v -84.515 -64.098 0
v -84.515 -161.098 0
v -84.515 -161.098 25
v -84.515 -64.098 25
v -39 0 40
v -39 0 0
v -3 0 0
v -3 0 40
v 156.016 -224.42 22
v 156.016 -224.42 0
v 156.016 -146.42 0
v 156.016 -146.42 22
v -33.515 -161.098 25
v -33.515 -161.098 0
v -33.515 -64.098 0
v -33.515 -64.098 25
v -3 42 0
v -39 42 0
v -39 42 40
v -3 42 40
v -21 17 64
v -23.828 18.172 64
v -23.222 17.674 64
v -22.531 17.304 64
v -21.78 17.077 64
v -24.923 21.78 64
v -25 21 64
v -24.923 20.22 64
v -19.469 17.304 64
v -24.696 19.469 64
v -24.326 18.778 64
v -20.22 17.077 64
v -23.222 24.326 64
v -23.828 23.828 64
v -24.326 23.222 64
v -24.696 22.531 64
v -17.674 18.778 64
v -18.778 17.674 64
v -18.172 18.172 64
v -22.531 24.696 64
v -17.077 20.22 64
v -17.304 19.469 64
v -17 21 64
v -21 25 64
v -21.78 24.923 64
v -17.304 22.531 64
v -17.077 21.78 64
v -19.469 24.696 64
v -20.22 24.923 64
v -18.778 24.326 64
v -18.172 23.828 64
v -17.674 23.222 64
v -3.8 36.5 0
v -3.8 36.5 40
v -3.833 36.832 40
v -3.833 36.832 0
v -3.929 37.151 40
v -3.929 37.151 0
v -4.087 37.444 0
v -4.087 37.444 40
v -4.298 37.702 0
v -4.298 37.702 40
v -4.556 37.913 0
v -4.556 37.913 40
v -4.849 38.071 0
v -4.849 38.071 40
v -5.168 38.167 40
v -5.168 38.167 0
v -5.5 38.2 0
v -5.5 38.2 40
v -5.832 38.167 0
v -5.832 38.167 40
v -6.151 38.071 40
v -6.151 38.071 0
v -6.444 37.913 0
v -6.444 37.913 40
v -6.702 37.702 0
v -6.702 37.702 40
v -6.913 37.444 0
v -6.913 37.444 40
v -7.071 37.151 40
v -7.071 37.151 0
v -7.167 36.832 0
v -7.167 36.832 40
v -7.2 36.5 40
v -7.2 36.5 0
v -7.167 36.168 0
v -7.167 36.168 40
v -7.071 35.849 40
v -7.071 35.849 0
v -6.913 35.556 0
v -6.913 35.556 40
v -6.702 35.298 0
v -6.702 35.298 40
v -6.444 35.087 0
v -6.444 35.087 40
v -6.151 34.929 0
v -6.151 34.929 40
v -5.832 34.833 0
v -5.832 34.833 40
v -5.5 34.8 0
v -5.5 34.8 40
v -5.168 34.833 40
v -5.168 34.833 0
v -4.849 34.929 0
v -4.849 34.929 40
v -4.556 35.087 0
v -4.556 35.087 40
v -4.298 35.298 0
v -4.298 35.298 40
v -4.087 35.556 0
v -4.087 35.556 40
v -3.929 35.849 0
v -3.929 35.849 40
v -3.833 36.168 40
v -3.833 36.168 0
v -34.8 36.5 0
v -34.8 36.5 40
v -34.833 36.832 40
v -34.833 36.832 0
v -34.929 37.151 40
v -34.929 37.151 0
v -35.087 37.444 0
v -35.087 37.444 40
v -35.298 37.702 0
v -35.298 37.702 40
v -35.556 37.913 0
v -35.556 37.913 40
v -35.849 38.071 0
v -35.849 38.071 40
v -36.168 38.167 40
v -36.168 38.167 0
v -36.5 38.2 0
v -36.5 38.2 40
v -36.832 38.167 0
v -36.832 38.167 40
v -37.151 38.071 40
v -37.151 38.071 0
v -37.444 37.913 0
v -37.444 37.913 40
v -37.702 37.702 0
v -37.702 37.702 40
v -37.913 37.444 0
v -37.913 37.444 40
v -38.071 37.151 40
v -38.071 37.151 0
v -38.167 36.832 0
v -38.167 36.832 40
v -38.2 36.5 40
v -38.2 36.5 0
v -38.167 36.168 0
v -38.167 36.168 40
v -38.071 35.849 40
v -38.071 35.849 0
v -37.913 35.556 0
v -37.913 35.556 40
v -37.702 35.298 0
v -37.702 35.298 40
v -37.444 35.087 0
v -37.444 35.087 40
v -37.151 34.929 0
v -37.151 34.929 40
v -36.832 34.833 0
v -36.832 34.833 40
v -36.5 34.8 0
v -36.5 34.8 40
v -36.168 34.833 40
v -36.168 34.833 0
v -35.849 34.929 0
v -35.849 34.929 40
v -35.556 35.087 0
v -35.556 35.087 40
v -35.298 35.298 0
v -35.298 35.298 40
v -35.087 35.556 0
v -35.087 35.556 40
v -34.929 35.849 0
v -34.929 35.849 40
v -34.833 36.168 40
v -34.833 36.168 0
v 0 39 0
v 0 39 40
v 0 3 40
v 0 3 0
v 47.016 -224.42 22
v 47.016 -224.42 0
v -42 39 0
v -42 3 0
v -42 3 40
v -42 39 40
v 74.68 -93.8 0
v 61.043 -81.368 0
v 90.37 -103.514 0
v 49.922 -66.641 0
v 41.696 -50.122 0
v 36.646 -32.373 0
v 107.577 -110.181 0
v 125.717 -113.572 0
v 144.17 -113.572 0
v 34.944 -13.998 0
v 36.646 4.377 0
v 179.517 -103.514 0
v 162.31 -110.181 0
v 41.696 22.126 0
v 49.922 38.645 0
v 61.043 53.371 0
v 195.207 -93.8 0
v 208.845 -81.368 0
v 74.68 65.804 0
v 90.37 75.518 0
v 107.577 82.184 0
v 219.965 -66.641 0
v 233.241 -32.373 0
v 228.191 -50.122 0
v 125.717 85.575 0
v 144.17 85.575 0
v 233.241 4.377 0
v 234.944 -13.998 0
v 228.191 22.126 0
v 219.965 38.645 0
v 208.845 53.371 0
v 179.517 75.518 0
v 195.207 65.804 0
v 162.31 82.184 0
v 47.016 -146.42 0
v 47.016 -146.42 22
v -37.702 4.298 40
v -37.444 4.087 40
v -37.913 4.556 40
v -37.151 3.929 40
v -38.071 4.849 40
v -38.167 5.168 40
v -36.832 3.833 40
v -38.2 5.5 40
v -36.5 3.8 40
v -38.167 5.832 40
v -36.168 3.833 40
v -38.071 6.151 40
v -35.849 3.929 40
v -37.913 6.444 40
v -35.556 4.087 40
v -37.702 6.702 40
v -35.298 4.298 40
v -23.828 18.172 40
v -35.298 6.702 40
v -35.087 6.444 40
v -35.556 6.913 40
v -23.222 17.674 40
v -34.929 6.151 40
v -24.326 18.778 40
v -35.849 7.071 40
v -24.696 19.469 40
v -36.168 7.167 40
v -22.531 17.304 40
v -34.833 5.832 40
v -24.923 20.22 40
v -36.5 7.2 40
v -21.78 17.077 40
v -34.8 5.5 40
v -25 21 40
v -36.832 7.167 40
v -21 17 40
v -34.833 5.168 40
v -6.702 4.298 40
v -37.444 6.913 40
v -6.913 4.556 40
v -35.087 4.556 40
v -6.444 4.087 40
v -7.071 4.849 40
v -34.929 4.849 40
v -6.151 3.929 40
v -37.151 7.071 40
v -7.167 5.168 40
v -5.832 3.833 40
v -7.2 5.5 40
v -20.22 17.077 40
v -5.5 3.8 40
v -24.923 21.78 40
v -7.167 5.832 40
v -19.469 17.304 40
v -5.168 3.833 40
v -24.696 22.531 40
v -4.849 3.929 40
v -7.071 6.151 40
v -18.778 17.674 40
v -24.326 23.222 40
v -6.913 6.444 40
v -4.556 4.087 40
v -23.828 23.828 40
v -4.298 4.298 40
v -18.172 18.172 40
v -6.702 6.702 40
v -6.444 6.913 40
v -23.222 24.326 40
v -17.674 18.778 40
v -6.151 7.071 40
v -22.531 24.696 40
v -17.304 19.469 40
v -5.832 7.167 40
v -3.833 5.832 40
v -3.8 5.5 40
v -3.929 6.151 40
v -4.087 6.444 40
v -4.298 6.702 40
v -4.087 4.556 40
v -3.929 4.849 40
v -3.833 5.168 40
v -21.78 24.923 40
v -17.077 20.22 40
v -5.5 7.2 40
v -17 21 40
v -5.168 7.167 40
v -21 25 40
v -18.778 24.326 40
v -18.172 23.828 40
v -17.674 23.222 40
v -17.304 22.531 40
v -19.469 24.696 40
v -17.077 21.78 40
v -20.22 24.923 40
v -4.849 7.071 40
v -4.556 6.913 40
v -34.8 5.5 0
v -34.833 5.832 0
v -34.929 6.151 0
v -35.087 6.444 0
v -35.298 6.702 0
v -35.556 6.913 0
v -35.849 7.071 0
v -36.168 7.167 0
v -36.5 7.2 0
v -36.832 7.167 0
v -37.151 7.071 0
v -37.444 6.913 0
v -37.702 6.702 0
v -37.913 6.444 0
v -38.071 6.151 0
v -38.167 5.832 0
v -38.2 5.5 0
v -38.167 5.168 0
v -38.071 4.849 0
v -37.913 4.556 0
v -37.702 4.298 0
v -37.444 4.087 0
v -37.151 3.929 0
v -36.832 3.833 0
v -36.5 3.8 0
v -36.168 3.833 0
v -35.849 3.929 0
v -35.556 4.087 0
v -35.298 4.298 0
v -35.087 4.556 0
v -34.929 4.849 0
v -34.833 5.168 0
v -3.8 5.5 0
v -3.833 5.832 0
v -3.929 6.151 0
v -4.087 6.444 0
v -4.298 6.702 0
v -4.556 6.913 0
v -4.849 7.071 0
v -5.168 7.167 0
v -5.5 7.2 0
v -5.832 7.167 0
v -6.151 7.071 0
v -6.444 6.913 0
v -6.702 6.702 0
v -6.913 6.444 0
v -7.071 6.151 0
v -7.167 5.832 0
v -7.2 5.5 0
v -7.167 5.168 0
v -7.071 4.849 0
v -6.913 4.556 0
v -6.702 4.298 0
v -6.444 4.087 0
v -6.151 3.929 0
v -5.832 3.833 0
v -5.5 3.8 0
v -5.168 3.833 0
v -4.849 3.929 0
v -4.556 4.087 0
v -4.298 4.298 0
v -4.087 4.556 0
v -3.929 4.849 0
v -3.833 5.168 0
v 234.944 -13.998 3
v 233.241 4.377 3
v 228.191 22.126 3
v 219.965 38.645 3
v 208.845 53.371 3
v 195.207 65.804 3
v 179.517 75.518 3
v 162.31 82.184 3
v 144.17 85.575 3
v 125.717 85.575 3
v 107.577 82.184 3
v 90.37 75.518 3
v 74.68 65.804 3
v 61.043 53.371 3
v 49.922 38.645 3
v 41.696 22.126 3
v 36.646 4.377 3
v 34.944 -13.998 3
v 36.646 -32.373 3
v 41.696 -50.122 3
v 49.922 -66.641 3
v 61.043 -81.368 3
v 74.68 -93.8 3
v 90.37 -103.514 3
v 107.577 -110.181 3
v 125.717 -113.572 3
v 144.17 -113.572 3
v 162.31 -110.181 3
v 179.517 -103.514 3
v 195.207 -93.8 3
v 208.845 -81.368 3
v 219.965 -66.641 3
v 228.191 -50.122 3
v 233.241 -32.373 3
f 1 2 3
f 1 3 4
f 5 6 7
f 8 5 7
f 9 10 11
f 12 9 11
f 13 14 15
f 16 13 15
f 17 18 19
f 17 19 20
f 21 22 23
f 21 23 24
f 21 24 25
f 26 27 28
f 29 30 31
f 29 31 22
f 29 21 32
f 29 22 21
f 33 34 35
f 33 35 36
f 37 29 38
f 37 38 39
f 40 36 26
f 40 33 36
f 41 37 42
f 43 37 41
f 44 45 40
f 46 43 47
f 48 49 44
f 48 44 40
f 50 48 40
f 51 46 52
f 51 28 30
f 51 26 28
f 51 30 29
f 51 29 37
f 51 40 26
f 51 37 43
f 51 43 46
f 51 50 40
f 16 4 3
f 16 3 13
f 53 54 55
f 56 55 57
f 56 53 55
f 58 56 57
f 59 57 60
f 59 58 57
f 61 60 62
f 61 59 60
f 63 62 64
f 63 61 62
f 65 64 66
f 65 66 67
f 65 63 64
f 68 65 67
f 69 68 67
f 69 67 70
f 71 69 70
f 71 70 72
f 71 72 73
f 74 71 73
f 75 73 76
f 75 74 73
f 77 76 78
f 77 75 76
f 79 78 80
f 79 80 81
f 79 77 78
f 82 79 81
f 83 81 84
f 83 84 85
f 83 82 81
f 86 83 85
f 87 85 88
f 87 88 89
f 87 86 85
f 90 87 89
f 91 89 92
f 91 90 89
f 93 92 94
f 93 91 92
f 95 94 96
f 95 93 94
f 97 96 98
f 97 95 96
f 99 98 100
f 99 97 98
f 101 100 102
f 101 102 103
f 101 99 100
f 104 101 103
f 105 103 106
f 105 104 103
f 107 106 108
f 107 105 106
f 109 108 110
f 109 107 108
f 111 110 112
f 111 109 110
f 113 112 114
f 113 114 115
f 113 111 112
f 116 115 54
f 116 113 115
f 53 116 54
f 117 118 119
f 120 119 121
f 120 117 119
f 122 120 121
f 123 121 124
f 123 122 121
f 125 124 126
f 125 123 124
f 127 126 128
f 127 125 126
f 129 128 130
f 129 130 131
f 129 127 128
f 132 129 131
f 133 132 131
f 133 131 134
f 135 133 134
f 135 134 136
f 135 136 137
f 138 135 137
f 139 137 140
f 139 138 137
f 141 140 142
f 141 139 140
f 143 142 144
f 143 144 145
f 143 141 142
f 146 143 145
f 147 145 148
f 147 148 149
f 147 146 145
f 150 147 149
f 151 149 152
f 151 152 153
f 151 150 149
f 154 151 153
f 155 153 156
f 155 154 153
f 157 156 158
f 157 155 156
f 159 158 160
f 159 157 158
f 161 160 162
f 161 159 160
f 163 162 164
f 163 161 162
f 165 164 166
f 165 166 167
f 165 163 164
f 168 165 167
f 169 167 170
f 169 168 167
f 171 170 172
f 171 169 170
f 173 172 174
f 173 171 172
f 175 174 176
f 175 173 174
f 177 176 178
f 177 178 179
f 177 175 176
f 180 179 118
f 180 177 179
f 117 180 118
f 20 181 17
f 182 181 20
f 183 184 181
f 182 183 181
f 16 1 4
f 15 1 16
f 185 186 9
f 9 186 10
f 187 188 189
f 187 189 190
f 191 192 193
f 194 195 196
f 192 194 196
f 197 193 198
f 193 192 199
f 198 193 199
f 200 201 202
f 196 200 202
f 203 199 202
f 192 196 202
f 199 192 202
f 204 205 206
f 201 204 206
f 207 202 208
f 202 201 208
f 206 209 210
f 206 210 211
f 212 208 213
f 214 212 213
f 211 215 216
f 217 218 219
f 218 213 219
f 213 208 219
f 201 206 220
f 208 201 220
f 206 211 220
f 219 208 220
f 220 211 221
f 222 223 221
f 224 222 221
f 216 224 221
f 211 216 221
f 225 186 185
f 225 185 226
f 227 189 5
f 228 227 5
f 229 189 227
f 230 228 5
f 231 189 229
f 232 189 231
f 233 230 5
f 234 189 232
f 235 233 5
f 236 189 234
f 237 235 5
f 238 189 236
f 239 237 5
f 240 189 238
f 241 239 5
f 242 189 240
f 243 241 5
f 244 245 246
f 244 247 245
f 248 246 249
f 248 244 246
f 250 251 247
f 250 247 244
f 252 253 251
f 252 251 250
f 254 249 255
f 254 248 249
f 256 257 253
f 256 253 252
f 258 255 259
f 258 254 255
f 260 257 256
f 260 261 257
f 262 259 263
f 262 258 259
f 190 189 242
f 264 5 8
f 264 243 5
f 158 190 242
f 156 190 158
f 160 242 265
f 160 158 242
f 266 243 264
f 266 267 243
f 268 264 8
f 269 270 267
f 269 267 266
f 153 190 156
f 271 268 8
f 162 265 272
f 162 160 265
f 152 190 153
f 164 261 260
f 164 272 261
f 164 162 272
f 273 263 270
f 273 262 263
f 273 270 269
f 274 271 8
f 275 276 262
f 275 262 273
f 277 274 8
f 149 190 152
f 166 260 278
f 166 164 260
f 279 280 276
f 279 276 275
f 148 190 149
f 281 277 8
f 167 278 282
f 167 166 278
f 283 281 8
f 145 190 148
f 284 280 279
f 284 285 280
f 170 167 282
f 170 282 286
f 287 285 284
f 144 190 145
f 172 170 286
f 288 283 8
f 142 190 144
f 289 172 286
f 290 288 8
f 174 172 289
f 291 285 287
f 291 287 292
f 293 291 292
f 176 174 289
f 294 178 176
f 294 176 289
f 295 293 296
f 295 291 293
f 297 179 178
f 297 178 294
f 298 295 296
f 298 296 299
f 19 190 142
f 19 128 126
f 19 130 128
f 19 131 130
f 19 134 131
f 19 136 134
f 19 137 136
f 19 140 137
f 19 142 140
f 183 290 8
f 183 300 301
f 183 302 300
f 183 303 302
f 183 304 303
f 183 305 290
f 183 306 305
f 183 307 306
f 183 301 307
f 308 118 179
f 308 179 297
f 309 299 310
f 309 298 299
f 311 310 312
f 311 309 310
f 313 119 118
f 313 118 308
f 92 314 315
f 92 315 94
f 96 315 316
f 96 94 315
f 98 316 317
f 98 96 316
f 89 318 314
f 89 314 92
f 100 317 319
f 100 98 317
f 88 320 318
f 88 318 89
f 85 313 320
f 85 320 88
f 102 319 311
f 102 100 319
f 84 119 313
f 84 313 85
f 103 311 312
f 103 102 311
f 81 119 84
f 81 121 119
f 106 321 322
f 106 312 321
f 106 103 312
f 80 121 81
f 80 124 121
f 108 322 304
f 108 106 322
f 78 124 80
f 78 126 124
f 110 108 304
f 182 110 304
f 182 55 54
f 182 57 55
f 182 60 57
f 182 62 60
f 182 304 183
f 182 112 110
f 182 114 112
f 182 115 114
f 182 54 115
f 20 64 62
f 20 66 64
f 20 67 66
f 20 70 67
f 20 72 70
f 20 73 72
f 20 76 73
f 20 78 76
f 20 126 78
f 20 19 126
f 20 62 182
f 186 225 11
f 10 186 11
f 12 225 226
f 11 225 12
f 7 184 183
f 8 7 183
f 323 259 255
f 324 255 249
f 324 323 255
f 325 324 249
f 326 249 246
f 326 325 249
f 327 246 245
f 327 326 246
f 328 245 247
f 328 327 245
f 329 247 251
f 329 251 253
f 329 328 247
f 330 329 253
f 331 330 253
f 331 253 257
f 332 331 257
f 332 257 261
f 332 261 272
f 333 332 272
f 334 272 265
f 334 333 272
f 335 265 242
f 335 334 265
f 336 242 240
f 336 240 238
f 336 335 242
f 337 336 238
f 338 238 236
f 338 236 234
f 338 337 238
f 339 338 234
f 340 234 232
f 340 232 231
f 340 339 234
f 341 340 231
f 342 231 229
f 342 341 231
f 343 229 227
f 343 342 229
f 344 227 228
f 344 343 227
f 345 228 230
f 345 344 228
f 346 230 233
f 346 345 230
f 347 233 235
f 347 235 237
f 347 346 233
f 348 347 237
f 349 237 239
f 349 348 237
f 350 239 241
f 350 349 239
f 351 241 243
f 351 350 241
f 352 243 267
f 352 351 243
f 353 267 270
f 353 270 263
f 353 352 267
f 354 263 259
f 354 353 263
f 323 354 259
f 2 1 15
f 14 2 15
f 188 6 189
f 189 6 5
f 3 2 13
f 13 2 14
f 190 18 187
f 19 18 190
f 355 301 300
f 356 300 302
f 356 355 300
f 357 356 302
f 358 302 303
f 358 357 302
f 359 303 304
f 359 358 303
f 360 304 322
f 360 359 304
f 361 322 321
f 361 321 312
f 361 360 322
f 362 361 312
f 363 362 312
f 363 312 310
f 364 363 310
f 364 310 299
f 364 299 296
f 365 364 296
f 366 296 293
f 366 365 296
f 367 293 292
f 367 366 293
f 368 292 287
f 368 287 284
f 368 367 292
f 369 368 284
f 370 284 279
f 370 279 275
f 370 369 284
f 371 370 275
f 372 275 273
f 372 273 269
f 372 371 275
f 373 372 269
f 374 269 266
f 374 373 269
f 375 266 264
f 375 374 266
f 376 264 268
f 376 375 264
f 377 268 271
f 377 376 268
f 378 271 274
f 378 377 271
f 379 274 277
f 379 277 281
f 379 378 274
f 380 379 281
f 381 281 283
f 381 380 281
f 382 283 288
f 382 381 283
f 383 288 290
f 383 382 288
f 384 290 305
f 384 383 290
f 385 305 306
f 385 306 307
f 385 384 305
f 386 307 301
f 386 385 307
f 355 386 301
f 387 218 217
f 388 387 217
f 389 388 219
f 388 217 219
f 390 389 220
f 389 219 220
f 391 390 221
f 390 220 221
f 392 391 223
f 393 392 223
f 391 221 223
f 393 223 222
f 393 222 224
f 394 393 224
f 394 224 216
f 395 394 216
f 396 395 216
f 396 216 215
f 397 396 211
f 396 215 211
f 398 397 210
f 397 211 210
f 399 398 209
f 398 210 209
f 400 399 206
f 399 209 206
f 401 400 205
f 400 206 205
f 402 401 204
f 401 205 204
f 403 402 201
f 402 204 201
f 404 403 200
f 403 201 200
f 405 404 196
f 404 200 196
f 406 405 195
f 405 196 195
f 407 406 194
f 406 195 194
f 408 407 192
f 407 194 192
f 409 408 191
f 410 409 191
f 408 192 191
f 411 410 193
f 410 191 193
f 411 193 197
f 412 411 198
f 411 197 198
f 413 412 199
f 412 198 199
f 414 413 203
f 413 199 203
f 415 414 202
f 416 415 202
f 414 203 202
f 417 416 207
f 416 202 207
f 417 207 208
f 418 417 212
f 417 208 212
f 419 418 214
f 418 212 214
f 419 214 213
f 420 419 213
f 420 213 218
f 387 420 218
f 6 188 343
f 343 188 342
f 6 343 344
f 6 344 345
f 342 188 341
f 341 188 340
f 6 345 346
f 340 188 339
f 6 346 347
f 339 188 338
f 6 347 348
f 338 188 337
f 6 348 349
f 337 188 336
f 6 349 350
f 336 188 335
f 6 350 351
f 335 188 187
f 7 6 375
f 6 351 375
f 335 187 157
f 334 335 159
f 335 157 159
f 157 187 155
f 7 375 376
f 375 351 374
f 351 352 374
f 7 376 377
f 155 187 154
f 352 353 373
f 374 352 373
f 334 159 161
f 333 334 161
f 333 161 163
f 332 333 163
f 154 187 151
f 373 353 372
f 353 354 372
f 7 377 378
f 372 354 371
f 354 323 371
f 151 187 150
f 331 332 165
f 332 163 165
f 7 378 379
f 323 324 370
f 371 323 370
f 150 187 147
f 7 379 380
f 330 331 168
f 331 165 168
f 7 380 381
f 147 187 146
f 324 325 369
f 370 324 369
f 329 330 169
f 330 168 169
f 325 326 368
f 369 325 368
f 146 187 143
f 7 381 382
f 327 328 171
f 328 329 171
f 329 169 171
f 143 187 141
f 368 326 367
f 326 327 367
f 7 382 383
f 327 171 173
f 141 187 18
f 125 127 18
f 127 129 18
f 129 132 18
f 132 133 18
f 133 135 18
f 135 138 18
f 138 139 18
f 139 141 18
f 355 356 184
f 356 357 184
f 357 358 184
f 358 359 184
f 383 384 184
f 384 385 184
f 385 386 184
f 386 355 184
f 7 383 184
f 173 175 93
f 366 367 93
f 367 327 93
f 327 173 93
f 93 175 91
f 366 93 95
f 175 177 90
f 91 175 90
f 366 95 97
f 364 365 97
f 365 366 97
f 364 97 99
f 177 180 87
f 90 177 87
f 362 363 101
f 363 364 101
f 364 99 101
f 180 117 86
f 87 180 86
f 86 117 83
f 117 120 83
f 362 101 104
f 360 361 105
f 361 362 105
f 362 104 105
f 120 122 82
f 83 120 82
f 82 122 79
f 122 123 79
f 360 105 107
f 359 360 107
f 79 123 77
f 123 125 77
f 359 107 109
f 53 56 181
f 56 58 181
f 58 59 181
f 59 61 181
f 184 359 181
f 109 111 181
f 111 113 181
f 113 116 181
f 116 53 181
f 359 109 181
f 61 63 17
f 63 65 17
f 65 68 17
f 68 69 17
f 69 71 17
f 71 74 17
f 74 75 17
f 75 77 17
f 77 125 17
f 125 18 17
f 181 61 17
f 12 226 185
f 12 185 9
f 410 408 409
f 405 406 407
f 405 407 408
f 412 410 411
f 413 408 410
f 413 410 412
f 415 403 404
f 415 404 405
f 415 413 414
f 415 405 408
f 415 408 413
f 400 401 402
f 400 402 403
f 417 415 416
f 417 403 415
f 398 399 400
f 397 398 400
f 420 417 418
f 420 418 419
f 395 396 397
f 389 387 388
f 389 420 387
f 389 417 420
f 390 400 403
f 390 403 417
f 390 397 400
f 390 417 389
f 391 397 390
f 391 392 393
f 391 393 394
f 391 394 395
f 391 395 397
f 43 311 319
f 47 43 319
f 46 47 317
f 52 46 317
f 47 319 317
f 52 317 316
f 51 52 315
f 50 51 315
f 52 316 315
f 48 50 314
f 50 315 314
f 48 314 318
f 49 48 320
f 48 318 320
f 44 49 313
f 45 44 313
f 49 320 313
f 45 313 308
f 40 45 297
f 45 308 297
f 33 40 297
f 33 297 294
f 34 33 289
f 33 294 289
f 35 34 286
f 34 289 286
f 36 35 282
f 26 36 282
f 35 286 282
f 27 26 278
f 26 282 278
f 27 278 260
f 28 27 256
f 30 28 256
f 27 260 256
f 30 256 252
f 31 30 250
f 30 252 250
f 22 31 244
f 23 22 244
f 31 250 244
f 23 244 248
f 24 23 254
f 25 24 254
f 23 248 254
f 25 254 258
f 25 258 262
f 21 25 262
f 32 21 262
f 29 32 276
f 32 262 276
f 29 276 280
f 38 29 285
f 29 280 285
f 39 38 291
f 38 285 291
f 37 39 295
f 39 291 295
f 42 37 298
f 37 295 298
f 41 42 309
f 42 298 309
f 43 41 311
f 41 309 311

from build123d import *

# Parameters (mm, degrees)
F0_W      = 42
F0_H      = 42
F0_R      = 1.7
F1_DEPTH  = 40
F2_R      = 4
F3_DEPTH  = 24
F4_SIZE   = 3
F5_R      = 100
F6_DEPTH  = 3
F7_W      = 51
F7_H      = 97
F8_DEPTH  = 25
F9_W      = 109
F9_H      = 78
F10_DEPTH = 22


with BuildPart() as f1:
    # F0 (on Top) → F1 (new body)
    with BuildSketch(Plane.XY):
        with Locations((-21, 21)):
            Rectangle(F0_W, F0_H)
        with Locations((-36.5, 5.5)):
            Circle(F0_R, mode=Mode.SUBTRACT)
        with Locations((-5.5, 5.5)):
            Circle(F0_R, mode=Mode.SUBTRACT)
        with Locations((-36.5, 36.5)):
            Circle(F0_R, mode=Mode.SUBTRACT)
        with Locations((-5.5, 36.5)):
            Circle(F0_R, mode=Mode.SUBTRACT)
    extrude(amount=F1_DEPTH)

    # F2 (on face) → F3 (join)
    with BuildSketch(Plane.XY.offset(40)):
        with Locations((-21, 21)):
            Circle(F2_R)
    extrude(amount=F3_DEPTH)

    # F4
    f4_edges = [f1.edges().sort_by_distance(p)[0] for p in [
        (0, 42, 20),
        (0, 0, 20),
        (-42, 0, 20),
        (-42, 42, 20),
    ]]
    chamfer(f4_edges, length=F4_SIZE)


with BuildPart() as f6:
    # F5 (on Top) → F6 (new body)
    with BuildSketch(Plane.XY):
        with Locations((134.943619, -13.99817)):
            Circle(F5_R)
    extrude(amount=F6_DEPTH)


with BuildPart() as f8:
    # F7 (on Top) → F8 (new body)
    with BuildSketch(Plane.XY):
        with Locations((-59.015086, -112.598025)):
            Rectangle(F7_W, F7_H)
    extrude(amount=F8_DEPTH)


with BuildPart() as f10:
    # F9 (on Top) → F10 (new body)
    with BuildSketch(Plane.XY):
        with Locations((101.516344, -185.419658)):
            Rectangle(F9_W, F9_H)
    extrude(amount=F10_DEPTH)


solid = Compound([f1.part, f6.part, f8.part, f10.part])
